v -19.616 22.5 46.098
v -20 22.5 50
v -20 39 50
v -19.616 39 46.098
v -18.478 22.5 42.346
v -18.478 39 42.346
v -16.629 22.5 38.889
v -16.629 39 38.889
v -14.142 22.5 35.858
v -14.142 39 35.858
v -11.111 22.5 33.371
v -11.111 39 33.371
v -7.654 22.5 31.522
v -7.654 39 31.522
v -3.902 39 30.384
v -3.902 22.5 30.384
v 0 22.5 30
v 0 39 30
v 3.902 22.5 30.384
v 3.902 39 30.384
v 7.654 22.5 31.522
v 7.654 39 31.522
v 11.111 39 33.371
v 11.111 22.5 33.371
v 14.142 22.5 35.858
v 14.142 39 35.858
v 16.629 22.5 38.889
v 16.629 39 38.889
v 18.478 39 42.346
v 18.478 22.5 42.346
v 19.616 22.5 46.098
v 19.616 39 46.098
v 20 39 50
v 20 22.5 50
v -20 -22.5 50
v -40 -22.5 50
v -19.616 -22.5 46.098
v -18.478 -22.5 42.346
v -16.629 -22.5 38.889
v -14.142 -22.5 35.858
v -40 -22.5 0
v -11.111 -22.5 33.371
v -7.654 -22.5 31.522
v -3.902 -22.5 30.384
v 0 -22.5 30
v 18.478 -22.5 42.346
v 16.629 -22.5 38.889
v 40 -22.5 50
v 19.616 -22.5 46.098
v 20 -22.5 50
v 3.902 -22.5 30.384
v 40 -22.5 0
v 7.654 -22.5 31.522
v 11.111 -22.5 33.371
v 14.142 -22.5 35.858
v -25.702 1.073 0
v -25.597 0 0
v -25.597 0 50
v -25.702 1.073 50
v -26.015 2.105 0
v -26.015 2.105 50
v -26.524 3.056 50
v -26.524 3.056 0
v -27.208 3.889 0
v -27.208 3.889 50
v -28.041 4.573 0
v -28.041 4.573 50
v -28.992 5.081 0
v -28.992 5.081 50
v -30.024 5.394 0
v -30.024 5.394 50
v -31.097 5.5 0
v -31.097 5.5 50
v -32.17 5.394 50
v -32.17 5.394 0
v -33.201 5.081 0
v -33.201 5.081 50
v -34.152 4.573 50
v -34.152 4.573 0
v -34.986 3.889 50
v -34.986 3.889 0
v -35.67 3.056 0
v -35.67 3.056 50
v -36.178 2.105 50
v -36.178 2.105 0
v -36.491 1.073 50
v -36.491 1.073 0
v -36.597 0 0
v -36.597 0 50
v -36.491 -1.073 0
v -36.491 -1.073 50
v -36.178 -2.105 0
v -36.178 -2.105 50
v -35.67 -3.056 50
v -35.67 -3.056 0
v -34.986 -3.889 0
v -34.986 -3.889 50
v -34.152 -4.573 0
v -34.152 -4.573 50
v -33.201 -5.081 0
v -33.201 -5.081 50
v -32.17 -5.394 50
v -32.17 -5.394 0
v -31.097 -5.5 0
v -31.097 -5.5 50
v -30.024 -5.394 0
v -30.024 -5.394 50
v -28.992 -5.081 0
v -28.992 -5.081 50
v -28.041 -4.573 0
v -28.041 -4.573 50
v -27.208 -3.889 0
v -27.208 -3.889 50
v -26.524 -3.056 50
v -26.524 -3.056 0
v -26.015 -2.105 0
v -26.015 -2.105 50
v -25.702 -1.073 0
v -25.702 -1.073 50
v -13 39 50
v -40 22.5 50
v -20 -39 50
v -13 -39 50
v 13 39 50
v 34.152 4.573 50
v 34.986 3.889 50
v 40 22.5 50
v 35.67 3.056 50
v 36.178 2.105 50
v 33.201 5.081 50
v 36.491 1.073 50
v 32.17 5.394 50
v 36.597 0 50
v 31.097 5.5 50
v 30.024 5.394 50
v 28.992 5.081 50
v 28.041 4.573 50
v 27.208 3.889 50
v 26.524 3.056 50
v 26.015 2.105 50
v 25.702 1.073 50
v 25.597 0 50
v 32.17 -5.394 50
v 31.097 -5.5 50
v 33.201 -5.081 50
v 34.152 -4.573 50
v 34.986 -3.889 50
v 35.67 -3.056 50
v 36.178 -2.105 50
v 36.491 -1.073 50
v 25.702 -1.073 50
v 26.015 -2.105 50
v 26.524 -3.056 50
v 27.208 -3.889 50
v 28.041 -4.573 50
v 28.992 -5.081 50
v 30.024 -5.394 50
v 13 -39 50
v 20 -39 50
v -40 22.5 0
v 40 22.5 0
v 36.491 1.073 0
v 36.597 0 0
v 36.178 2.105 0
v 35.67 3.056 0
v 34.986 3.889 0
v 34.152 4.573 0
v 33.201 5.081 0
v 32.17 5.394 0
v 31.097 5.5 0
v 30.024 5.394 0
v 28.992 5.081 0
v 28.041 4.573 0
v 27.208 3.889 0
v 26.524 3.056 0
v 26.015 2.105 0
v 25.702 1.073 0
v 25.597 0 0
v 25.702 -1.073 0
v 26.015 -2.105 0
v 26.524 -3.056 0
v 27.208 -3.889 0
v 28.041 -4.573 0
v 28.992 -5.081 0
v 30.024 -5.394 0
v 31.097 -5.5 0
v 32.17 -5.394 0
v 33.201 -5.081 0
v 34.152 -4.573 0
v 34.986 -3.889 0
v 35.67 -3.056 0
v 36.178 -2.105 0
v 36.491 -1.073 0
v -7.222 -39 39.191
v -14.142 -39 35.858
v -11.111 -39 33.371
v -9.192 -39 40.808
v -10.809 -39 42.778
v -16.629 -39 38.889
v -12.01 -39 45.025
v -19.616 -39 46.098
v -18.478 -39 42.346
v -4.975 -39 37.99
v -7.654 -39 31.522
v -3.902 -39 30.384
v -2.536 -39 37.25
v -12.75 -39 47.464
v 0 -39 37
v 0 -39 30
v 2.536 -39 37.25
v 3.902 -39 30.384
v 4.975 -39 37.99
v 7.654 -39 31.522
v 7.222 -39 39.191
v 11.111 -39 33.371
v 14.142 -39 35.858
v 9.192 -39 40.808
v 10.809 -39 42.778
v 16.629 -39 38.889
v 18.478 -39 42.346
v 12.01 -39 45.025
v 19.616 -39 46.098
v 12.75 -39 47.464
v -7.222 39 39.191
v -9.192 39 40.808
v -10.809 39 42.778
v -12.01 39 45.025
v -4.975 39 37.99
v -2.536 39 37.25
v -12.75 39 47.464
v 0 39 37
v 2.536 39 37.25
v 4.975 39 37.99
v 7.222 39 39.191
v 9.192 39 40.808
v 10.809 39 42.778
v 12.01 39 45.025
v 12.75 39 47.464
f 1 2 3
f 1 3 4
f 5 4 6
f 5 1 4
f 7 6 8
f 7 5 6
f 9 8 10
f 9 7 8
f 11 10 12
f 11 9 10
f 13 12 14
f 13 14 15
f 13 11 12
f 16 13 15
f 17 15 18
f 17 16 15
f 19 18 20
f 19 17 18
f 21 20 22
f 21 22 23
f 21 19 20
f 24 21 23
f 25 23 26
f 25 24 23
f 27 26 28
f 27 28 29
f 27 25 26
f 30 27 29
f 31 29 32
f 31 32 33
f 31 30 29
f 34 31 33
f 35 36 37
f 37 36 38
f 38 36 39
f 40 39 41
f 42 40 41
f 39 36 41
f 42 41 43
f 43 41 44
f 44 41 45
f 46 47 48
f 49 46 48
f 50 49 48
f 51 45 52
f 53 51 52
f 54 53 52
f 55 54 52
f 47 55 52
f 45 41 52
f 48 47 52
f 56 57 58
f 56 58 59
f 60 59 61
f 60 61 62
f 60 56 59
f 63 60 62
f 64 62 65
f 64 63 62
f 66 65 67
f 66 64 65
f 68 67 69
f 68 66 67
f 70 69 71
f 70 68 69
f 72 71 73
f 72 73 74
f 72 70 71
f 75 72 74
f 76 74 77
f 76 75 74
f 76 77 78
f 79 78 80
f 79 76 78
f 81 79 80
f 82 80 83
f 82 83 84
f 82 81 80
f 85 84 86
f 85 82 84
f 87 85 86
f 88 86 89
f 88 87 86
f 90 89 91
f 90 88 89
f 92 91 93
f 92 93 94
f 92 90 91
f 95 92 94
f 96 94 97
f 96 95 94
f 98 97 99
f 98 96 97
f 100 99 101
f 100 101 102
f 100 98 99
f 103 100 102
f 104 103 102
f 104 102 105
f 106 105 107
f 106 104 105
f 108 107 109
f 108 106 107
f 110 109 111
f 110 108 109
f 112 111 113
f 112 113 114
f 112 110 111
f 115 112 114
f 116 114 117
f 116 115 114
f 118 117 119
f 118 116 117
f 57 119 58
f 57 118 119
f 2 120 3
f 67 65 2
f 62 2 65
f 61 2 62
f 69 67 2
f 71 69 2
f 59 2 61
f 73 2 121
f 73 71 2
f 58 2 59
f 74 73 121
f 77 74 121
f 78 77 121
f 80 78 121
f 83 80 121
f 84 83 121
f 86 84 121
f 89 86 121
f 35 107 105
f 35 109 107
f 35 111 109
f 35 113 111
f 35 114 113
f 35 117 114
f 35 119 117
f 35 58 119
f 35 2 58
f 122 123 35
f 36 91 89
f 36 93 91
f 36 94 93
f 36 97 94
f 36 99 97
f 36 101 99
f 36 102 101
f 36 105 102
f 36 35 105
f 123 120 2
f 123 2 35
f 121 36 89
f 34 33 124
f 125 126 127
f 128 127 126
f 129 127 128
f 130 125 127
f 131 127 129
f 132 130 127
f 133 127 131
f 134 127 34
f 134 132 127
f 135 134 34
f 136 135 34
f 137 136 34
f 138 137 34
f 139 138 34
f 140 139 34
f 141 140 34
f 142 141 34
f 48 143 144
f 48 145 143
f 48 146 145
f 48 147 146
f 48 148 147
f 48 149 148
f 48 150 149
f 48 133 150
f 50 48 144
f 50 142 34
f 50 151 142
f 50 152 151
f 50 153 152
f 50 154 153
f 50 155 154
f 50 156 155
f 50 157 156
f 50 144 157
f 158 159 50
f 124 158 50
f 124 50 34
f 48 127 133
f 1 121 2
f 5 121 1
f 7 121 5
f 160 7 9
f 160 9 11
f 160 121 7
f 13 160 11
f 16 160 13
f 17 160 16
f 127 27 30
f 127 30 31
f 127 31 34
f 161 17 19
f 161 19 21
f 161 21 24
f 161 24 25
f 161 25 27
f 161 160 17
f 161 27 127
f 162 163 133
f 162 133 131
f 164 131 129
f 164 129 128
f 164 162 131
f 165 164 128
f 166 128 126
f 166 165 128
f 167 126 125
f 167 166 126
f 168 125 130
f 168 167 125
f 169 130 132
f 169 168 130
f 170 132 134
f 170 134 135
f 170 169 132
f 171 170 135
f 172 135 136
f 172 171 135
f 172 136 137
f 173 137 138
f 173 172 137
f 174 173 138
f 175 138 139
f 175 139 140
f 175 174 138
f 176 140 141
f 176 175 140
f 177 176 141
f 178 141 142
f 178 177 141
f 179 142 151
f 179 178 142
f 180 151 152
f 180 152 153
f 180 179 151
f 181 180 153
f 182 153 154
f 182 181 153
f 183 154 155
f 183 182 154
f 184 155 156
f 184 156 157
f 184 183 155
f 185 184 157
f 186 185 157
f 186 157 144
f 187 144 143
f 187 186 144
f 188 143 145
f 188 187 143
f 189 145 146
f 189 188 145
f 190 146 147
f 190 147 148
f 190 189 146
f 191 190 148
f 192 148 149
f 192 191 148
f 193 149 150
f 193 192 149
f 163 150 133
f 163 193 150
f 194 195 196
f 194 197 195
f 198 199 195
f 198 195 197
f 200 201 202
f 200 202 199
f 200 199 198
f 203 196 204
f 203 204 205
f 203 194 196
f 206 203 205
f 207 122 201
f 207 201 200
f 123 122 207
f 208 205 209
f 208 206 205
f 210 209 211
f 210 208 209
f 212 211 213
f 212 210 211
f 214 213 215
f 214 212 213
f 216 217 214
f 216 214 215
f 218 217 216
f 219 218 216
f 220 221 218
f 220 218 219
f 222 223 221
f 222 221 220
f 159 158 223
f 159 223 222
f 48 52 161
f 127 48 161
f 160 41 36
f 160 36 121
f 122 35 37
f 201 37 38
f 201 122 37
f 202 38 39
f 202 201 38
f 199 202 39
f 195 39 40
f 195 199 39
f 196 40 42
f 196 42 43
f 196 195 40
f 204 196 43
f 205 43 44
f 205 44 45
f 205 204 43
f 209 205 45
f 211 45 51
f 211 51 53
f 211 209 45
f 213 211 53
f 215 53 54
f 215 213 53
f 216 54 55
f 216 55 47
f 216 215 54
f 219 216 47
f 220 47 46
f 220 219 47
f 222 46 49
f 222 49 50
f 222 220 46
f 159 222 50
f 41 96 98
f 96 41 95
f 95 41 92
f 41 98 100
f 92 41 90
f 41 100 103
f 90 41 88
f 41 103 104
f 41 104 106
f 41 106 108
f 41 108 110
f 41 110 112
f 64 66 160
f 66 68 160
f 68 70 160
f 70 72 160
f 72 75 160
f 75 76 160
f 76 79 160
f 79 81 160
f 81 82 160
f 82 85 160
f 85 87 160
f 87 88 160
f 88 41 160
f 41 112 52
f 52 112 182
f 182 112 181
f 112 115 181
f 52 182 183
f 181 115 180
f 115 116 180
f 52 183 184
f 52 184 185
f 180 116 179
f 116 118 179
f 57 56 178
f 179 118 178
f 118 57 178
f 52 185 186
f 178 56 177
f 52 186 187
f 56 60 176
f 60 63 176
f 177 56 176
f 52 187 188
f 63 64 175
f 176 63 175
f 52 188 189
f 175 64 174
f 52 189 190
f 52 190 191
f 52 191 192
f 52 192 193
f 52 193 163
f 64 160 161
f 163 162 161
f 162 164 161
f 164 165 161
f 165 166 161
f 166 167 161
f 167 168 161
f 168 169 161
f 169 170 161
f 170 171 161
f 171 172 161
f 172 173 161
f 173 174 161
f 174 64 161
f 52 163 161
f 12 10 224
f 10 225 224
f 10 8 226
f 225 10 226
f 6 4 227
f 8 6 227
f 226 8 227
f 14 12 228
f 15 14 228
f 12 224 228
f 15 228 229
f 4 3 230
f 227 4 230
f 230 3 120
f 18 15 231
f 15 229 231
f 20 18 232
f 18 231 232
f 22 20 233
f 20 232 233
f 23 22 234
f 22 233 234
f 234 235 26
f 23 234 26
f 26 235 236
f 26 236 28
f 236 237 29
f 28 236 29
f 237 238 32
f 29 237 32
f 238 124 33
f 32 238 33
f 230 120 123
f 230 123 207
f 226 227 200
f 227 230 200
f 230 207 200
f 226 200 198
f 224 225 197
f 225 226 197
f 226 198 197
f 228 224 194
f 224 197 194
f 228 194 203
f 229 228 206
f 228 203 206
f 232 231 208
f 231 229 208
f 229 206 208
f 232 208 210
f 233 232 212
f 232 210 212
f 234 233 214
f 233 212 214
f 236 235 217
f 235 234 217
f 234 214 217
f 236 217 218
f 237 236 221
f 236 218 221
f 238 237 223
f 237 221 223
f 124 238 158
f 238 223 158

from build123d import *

# Parameters (mm, degrees)
F0_W     = 80
F0_H     = 45
F0_R     = 5.5
F1_DEPTH = 50
F3_DEPTH = 39
F4_DEPTH = 45


with BuildPart() as f1:
    # F0 (on Top) → F1 (new body)
    with BuildSketch(Plane.XY):
        Rectangle(F0_W, F0_H)
        with Locations((-31.096611172, 0)):
            Circle(F0_R, mode=Mode.SUBTRACT)
        with Locations((31.096611172, 0)):
            Circle(F0_R, mode=Mode.SUBTRACT)
    extrude(amount=F1_DEPTH)

    # F2 (on Front) → F3 (join, symmetric)
    with BuildSketch(Plane.XZ):
        with BuildLine():
            ThreePointArc((-20, 50), (0, 30), (20, 50))
            Line((20, 50), (13, 50))
            ThreePointArc((13, 50), (0, 37), (-13, 50))
            Line((-13, 50), (-20, 50))
        make_face()
    extrude(amount=F3_DEPTH, both=True)

    # F4 (cut, through all): a face of the model
    f4_faces = [f1.faces().sort_by_distance(p)[0] for p in [
        (0, -22.5, 44.4826286395),
    ]]
    extrude(f4_faces, amount=-F4_DEPTH, mode=Mode.SUBTRACT)


solid = f1.part
